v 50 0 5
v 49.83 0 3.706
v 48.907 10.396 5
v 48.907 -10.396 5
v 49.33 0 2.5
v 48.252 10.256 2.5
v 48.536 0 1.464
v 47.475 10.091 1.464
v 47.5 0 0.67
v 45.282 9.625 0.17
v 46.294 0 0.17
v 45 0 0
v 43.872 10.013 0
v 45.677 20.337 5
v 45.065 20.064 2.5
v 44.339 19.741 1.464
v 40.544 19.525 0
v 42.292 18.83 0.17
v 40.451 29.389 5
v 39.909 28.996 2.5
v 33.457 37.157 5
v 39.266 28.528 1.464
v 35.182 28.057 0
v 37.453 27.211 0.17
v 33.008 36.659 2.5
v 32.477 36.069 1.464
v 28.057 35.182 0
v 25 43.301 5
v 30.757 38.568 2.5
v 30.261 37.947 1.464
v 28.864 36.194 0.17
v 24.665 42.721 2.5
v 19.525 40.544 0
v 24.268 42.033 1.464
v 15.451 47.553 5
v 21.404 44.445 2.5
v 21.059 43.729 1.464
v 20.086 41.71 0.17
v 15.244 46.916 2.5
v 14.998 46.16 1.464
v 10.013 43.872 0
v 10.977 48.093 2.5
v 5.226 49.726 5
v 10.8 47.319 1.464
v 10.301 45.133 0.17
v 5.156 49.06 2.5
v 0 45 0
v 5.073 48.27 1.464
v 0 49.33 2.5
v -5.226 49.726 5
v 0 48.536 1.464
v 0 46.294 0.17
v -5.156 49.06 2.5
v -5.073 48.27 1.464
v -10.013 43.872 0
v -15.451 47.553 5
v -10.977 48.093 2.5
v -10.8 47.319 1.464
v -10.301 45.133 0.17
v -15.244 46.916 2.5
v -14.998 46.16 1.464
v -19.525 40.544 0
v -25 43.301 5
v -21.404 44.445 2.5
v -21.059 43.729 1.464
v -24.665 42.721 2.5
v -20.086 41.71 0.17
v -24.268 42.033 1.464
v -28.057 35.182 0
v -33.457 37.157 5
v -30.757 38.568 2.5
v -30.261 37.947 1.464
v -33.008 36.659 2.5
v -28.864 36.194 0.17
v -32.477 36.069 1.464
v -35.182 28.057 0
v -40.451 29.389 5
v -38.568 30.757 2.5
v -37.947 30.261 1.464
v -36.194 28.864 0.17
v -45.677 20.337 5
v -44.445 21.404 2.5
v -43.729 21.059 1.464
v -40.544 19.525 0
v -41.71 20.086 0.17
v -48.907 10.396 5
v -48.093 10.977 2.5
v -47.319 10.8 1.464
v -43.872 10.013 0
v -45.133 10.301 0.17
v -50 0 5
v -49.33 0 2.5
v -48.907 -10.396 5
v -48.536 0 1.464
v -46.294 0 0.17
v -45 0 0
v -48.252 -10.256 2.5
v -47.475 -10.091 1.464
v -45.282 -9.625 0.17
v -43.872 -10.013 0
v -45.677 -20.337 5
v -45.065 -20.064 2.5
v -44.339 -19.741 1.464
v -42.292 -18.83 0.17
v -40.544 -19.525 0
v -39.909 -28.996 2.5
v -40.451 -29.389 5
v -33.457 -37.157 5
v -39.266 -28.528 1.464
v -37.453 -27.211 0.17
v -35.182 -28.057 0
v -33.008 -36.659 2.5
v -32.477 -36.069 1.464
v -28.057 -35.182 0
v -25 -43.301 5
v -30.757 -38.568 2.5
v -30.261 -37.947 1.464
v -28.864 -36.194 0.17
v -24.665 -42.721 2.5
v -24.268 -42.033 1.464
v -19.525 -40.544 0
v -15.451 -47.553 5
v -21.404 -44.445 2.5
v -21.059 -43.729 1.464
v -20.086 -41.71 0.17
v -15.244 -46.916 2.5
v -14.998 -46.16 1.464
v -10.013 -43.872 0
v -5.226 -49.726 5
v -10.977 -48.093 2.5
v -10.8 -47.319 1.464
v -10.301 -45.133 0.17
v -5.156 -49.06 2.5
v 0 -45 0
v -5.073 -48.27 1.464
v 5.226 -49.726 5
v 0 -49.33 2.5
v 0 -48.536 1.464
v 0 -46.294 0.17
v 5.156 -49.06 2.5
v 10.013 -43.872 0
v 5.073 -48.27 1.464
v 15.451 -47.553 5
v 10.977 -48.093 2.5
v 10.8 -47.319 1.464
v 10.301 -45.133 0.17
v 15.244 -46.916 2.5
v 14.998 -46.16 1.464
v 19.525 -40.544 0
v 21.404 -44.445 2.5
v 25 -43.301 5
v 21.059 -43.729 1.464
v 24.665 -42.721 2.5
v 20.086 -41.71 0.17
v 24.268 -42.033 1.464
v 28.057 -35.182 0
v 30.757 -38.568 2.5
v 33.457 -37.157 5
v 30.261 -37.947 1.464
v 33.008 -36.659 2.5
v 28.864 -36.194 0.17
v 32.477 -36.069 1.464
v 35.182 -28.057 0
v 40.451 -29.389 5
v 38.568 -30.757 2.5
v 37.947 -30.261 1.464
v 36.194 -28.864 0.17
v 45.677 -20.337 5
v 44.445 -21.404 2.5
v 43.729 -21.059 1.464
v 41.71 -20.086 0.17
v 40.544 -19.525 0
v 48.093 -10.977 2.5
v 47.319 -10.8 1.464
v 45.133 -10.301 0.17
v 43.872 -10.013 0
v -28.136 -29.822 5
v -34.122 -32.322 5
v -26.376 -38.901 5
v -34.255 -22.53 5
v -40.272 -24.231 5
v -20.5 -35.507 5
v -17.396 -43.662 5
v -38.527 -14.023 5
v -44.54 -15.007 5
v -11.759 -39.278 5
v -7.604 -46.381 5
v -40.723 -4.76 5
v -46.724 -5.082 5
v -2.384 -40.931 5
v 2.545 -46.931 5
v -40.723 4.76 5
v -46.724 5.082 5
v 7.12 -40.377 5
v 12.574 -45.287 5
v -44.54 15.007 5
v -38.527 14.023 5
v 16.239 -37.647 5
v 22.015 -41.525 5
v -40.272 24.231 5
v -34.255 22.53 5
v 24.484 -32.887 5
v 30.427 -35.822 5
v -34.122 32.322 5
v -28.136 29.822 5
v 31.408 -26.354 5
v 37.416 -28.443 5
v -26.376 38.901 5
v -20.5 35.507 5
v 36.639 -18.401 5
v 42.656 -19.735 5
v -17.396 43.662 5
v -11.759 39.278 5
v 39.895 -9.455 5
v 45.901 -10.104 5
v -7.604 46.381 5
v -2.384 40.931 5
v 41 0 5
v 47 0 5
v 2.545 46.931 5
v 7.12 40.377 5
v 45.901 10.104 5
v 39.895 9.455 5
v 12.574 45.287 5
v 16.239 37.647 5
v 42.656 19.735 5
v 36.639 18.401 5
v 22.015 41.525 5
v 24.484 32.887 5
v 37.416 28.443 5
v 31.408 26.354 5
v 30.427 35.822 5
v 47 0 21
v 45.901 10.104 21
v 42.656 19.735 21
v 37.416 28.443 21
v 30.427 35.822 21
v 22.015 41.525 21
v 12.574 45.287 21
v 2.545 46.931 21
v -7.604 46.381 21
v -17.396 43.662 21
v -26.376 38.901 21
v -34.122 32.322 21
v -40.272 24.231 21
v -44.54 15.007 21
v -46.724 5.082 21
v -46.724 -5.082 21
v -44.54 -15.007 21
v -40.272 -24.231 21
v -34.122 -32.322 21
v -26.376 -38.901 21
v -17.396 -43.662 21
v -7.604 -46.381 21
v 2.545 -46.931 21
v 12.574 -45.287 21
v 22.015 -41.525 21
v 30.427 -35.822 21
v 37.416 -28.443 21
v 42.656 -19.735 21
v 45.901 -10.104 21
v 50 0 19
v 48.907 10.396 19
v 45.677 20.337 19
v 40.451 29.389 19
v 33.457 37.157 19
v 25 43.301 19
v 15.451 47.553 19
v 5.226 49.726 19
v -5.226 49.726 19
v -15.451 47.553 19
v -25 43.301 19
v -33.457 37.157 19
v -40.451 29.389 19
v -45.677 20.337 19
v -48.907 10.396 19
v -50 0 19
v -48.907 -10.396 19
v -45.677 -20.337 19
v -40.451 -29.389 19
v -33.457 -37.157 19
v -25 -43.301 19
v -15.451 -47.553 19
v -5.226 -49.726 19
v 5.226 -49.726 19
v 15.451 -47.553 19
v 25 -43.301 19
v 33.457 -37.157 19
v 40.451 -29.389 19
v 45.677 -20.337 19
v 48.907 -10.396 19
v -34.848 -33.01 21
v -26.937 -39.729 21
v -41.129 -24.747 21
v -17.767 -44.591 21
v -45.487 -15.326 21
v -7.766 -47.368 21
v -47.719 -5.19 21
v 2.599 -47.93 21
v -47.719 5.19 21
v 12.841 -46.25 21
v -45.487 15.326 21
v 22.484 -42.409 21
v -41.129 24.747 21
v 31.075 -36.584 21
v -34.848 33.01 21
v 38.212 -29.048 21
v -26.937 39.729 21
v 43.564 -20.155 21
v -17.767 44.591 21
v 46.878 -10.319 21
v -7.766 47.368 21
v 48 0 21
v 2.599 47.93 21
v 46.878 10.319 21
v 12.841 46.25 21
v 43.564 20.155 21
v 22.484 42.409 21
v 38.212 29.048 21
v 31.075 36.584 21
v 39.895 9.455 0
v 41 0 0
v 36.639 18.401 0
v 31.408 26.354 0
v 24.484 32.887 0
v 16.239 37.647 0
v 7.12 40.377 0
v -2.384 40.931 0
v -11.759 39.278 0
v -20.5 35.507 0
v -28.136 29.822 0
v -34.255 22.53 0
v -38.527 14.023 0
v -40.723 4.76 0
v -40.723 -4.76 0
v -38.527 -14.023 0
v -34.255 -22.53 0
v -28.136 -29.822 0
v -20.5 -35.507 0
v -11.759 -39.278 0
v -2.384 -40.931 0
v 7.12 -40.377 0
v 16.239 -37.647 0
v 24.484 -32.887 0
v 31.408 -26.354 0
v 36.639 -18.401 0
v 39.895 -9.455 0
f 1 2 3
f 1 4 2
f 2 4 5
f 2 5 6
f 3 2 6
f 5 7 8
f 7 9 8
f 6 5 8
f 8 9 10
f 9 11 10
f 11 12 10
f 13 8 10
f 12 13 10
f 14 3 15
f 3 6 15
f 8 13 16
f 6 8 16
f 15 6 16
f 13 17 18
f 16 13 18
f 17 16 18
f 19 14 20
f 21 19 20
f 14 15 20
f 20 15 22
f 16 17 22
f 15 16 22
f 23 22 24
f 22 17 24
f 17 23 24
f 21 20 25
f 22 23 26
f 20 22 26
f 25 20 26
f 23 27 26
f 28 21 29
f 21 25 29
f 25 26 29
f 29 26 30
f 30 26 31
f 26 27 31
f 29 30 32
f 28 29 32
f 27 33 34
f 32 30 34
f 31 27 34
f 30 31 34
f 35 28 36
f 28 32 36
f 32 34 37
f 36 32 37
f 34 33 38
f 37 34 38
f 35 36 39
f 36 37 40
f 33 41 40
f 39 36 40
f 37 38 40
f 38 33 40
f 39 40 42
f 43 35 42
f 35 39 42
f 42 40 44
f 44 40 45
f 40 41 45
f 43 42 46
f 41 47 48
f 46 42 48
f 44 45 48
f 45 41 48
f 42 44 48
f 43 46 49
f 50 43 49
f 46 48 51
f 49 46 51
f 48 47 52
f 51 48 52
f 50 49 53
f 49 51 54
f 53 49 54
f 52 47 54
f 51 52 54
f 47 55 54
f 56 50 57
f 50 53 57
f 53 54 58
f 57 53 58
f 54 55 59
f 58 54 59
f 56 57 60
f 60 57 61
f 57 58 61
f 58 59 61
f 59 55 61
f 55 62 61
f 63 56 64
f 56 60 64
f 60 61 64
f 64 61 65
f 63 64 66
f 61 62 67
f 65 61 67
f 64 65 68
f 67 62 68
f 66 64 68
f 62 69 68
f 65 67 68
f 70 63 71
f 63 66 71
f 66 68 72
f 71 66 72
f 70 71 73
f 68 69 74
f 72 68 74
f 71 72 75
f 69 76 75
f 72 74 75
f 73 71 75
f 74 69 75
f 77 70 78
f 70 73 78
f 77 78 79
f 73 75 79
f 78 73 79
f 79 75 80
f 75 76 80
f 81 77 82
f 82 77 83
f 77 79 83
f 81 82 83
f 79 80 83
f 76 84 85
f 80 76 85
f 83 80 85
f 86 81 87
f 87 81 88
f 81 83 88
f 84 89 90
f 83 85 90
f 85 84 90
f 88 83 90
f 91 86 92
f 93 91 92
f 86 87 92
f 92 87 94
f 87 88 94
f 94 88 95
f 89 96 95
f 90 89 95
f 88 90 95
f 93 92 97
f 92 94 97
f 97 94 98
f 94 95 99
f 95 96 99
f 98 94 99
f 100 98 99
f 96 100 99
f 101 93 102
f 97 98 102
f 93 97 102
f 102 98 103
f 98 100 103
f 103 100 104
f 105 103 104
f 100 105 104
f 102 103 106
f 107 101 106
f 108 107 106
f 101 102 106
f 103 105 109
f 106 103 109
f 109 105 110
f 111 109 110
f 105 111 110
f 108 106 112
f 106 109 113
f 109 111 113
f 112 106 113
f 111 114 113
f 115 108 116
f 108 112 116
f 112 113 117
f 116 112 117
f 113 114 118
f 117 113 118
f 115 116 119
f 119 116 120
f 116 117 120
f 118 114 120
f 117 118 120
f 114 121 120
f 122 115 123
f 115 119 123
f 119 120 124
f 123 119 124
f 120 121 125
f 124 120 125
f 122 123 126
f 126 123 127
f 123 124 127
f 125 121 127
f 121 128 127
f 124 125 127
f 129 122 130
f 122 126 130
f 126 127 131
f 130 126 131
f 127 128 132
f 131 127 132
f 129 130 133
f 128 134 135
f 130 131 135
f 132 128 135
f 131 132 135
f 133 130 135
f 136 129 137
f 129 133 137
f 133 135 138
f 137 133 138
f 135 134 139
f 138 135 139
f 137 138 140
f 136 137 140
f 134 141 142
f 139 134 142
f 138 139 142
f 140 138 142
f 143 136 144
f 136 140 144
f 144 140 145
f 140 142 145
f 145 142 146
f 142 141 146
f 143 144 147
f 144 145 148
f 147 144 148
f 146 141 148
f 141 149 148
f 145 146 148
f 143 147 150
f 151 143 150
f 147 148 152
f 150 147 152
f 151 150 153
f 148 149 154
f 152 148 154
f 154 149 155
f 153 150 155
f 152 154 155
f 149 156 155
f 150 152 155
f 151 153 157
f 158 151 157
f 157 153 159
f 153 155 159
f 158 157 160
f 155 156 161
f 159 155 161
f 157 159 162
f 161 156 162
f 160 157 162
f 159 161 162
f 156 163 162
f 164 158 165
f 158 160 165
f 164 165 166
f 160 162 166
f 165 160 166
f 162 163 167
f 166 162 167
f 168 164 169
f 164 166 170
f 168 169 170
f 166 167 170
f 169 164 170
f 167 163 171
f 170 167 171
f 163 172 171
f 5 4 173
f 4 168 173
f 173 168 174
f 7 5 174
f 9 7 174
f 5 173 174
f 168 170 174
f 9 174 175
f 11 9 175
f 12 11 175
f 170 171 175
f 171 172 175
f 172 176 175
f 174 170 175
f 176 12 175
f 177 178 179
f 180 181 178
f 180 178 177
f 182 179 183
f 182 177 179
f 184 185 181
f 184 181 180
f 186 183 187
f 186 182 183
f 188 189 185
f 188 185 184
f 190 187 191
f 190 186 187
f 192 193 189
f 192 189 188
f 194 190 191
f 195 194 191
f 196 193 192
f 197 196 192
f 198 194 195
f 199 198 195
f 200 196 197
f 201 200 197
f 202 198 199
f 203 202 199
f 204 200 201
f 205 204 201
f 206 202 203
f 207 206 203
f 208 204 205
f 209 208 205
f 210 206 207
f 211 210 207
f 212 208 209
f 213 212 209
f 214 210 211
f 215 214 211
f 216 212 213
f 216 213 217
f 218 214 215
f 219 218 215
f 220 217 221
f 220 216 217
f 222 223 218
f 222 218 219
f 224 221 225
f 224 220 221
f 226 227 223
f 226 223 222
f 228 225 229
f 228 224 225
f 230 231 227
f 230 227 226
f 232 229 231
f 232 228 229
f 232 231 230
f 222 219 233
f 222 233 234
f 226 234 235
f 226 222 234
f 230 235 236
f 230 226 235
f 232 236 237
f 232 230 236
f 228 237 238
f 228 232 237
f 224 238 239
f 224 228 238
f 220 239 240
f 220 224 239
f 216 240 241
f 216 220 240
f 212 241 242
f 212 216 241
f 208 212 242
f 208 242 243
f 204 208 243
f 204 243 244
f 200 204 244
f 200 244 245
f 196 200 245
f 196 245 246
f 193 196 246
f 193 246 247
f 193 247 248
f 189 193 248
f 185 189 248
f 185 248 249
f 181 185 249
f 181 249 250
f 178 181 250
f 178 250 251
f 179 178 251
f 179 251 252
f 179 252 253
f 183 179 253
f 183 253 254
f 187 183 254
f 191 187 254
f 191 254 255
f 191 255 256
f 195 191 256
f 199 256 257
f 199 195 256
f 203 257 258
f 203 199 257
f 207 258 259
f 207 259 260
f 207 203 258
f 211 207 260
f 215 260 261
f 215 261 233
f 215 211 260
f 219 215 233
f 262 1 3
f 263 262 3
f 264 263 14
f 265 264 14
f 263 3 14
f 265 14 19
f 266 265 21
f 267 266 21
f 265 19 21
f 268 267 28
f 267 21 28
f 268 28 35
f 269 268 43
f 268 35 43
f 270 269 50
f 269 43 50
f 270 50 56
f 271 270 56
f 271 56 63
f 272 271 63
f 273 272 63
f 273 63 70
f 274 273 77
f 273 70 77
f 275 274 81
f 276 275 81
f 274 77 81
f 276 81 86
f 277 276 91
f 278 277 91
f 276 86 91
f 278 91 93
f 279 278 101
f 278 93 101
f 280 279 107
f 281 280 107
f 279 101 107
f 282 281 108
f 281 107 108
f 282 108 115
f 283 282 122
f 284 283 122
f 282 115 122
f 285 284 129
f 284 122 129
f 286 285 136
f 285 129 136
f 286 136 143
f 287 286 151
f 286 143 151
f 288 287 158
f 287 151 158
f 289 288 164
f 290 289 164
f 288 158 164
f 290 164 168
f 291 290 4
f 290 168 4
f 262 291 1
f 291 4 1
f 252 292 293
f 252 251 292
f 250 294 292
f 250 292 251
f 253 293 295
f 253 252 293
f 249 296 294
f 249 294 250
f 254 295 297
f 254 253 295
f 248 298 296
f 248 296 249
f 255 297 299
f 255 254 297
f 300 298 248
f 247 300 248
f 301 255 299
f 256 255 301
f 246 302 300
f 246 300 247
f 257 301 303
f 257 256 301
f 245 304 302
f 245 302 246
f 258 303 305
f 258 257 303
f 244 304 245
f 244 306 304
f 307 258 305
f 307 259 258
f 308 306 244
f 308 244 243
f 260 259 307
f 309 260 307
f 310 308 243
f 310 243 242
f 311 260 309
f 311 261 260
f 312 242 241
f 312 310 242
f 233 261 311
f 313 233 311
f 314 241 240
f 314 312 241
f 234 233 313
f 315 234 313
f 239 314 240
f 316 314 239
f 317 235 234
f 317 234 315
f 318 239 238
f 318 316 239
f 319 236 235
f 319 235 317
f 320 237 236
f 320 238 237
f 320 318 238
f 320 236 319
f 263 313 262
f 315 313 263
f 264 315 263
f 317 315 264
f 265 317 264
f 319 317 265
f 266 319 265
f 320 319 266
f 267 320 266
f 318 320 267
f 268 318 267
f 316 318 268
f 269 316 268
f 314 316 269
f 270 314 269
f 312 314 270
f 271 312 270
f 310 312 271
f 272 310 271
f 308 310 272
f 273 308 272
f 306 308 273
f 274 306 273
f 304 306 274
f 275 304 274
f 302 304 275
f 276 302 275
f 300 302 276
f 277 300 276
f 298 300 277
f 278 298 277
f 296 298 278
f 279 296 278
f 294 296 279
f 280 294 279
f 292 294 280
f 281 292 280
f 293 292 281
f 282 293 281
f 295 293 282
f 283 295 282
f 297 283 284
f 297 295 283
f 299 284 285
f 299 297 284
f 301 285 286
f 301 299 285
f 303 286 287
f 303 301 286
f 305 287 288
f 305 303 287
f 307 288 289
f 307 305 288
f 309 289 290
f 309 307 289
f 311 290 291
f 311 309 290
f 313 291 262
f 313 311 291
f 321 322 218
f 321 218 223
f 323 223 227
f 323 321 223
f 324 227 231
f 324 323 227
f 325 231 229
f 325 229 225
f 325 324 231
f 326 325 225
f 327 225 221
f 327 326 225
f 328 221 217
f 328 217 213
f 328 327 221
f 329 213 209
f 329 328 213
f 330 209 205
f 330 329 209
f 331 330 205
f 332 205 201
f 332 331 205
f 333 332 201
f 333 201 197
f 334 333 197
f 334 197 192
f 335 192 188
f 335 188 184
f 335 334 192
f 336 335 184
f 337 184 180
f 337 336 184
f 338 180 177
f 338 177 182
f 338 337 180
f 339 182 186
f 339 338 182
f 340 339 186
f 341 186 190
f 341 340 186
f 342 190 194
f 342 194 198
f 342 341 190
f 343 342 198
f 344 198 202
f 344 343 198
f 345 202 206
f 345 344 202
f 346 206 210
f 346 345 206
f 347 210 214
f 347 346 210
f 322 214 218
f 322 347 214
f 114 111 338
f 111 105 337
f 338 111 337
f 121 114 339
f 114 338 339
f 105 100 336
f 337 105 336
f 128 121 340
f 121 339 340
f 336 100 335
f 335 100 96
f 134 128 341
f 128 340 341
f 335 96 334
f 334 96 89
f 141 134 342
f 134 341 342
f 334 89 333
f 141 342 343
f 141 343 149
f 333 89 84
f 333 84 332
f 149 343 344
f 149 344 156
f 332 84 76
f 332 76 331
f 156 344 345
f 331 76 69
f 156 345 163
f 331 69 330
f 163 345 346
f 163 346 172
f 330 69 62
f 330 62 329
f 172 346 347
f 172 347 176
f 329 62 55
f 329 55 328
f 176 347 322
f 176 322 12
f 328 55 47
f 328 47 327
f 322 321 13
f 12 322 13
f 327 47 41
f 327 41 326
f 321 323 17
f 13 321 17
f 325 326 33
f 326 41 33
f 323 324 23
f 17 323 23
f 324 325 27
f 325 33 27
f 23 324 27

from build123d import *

# Parameters (mm, degrees)
F0_R     = 47.5
F0_R_2   = 41
F1_DEPTH = 5
F2_R     = 50
F2_R_2   = 47
F3_DEPTH = 21
F4_R     = 5
F5_SIZE  = 2


with BuildPart() as f1:
    # F0 (on Top) → F1 (new body)
    with BuildSketch(Plane.XY):
        Circle(F0_R)
        Circle(F0_R_2, mode=Mode.SUBTRACT)
    extrude(amount=F1_DEPTH)

    # F2 (on Top) → F3 (join)
    with BuildSketch(Plane.XY):
        Circle(F2_R)
        Circle(F2_R_2, mode=Mode.SUBTRACT)
    extrude(amount=F3_DEPTH)

    # F4
    f4_edges = [f1.edges().sort_by_distance(p)[0] for p in [
        (-50, 0, 0),
    ]]
    fillet(f4_edges, radius=F4_R)

    # F5
    f5_edges = [f1.edges().sort_by_distance(p)[0] for p in [
        (-50, 0, 21),
    ]]
    chamfer(f5_edges, length=F5_SIZE)


solid = f1.part
